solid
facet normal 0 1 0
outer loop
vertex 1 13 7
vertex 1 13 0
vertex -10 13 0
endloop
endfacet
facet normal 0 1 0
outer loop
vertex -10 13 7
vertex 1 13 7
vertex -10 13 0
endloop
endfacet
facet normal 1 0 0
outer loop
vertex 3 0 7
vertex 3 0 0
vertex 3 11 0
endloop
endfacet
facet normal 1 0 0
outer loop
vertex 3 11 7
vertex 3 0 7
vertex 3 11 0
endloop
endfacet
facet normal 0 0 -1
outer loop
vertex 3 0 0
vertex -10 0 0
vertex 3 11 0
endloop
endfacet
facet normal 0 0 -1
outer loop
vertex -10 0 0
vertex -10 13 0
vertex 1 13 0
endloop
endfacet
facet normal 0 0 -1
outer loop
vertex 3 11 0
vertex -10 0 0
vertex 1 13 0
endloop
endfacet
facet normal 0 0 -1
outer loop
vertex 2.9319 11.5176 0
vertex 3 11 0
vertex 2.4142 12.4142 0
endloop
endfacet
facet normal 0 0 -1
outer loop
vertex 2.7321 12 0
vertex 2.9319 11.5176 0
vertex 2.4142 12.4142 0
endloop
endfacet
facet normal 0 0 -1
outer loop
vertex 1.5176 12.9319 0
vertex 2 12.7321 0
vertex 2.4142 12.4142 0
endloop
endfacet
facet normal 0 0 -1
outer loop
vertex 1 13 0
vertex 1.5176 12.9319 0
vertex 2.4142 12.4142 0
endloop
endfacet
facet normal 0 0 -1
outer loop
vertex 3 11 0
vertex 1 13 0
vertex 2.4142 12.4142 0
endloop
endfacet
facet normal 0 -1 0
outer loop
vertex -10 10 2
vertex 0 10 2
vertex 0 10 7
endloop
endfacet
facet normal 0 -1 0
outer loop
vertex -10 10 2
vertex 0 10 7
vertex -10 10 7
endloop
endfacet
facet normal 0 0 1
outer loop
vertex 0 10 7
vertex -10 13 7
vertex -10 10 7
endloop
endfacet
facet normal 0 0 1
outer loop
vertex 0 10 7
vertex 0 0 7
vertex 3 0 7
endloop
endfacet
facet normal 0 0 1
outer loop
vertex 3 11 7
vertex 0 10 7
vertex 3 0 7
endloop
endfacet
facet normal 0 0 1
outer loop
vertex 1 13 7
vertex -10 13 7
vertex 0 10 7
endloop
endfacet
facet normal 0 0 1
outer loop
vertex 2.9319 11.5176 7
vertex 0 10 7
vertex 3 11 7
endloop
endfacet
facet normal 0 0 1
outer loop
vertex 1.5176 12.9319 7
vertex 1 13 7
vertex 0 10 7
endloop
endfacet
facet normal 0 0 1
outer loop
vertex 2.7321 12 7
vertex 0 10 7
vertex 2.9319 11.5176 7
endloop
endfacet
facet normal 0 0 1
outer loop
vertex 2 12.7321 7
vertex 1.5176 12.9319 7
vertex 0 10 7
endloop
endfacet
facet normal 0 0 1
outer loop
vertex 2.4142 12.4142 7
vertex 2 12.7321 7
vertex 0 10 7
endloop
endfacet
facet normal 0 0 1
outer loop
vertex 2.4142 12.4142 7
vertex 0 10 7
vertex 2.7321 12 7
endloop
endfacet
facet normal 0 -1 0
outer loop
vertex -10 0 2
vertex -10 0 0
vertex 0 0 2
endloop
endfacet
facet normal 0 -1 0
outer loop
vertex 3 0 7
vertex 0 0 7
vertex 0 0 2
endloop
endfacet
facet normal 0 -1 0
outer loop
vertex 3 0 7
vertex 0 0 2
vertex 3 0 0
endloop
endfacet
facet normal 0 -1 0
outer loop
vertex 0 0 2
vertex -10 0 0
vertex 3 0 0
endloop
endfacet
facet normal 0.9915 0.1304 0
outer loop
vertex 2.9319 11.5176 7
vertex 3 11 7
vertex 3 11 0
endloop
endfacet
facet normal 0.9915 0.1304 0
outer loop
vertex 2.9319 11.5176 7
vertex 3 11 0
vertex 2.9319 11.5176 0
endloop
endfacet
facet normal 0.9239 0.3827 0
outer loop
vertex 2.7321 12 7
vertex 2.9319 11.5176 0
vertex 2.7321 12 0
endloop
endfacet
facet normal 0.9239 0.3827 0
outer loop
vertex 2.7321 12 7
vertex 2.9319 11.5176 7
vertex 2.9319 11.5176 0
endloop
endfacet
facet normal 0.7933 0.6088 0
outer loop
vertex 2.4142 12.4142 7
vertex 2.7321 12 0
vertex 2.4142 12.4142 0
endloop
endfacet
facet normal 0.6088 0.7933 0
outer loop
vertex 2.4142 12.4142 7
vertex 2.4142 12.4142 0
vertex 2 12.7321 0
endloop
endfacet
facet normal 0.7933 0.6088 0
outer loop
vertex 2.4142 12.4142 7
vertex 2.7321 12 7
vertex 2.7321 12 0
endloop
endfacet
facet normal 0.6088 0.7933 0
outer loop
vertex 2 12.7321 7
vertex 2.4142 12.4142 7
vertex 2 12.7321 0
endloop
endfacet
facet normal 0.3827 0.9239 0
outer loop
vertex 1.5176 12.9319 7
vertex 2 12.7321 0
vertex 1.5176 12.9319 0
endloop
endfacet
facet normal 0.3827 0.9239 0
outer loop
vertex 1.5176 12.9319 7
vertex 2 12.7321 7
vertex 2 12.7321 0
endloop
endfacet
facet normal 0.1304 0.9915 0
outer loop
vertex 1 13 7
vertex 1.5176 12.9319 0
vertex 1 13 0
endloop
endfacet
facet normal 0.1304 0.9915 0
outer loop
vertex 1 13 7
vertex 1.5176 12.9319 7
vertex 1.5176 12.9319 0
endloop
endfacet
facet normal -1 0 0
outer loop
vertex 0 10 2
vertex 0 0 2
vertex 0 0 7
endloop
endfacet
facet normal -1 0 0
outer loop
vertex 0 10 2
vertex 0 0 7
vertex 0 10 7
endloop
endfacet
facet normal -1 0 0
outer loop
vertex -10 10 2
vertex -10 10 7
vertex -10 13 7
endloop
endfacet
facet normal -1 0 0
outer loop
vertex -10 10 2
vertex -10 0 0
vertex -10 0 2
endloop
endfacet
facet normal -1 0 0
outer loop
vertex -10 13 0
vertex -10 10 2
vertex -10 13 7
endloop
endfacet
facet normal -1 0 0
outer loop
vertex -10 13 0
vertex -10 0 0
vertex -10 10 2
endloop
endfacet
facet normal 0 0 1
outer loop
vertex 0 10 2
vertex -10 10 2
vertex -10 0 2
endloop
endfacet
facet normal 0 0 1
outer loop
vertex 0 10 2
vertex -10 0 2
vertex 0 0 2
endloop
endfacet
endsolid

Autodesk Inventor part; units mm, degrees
ref_plane "YZ Plane" through (0, 0, 0) normal (1, 0, 0) x (0, 1, 0)
ref_plane "XZ Plane" through (0, 0, 0) normal (0, 1, 0) x (-1, 0, 0)
ref_plane "XY Plane" through (0, 0, 0) normal (0, 0, 1) x (1, 0, 0)
sketch "Esquisse1" plane through (0, 0, 0) normal (0, 0, 1) x (1, 0, 0)
  line L0 (0, -2.6) -> (0, 15.6) projected
  line L1 (-12.6, 0) -> (5.6, 0) projected
  line L2 (-10, 10) -> (0, 10)
  line L3 (0, 10) -> (0, 0)
  line L4 (0, 0) -> (-10, 0)
  line L5 (-10, 0) -> (-10, 10)
  line L6 (-10, 10) -> (0, 10)
  line L7 (0, 10) -> (0, 13)
  line L8 (0, 13) -> (-10, 13)
  line L9 (-10, 13) -> (-10, 10)
  line L10 (0, 0) -> (3, 0)
  line L11 (3, 0) -> (3, 13)
  line L12 (3, 13) -> (0, 13)
  line L13 (0, 13) -> (0, 0)
  dimension "d0" = 10
  dimension "d1" = 10
  dimension "d2" = 3
  dimension "d3" = 3
extrude "Extrusion1" add sketch "Esquisse1" along normal blind 2
sketch "Esquisse2" plane through (0, 0, 2) normal (0, 0, 1) x (1, 0, 0)
  line L0 (3, 13) -> (-10, 13) projected
  line L1 (3, 0) -> (3, 13) projected
  line L2 (-10, 13) -> (3, 13)
  line L3 (3, 13) -> (3, 10)
  line L4 (3, 10) -> (-10, 10)
  line L5 (-10, 10) -> (-10, 13)
  line L6 (3, 0) -> (0, 0)
  line L7 (0, 0) -> (0, 10)
  line L8 (0, 10) -> (3, 10)
  line L9 (3, 10) -> (3, 0)
  dimension "d6" = 3
  dimension "d7" = 3
extrude "Extrusion2" add sketch "Esquisse2" along normal blind 5
fillet "Congé1" radius 2 1 edges at (3, 13, 3.5)
properties part number "pièce_intérieur_coque_RPI"
